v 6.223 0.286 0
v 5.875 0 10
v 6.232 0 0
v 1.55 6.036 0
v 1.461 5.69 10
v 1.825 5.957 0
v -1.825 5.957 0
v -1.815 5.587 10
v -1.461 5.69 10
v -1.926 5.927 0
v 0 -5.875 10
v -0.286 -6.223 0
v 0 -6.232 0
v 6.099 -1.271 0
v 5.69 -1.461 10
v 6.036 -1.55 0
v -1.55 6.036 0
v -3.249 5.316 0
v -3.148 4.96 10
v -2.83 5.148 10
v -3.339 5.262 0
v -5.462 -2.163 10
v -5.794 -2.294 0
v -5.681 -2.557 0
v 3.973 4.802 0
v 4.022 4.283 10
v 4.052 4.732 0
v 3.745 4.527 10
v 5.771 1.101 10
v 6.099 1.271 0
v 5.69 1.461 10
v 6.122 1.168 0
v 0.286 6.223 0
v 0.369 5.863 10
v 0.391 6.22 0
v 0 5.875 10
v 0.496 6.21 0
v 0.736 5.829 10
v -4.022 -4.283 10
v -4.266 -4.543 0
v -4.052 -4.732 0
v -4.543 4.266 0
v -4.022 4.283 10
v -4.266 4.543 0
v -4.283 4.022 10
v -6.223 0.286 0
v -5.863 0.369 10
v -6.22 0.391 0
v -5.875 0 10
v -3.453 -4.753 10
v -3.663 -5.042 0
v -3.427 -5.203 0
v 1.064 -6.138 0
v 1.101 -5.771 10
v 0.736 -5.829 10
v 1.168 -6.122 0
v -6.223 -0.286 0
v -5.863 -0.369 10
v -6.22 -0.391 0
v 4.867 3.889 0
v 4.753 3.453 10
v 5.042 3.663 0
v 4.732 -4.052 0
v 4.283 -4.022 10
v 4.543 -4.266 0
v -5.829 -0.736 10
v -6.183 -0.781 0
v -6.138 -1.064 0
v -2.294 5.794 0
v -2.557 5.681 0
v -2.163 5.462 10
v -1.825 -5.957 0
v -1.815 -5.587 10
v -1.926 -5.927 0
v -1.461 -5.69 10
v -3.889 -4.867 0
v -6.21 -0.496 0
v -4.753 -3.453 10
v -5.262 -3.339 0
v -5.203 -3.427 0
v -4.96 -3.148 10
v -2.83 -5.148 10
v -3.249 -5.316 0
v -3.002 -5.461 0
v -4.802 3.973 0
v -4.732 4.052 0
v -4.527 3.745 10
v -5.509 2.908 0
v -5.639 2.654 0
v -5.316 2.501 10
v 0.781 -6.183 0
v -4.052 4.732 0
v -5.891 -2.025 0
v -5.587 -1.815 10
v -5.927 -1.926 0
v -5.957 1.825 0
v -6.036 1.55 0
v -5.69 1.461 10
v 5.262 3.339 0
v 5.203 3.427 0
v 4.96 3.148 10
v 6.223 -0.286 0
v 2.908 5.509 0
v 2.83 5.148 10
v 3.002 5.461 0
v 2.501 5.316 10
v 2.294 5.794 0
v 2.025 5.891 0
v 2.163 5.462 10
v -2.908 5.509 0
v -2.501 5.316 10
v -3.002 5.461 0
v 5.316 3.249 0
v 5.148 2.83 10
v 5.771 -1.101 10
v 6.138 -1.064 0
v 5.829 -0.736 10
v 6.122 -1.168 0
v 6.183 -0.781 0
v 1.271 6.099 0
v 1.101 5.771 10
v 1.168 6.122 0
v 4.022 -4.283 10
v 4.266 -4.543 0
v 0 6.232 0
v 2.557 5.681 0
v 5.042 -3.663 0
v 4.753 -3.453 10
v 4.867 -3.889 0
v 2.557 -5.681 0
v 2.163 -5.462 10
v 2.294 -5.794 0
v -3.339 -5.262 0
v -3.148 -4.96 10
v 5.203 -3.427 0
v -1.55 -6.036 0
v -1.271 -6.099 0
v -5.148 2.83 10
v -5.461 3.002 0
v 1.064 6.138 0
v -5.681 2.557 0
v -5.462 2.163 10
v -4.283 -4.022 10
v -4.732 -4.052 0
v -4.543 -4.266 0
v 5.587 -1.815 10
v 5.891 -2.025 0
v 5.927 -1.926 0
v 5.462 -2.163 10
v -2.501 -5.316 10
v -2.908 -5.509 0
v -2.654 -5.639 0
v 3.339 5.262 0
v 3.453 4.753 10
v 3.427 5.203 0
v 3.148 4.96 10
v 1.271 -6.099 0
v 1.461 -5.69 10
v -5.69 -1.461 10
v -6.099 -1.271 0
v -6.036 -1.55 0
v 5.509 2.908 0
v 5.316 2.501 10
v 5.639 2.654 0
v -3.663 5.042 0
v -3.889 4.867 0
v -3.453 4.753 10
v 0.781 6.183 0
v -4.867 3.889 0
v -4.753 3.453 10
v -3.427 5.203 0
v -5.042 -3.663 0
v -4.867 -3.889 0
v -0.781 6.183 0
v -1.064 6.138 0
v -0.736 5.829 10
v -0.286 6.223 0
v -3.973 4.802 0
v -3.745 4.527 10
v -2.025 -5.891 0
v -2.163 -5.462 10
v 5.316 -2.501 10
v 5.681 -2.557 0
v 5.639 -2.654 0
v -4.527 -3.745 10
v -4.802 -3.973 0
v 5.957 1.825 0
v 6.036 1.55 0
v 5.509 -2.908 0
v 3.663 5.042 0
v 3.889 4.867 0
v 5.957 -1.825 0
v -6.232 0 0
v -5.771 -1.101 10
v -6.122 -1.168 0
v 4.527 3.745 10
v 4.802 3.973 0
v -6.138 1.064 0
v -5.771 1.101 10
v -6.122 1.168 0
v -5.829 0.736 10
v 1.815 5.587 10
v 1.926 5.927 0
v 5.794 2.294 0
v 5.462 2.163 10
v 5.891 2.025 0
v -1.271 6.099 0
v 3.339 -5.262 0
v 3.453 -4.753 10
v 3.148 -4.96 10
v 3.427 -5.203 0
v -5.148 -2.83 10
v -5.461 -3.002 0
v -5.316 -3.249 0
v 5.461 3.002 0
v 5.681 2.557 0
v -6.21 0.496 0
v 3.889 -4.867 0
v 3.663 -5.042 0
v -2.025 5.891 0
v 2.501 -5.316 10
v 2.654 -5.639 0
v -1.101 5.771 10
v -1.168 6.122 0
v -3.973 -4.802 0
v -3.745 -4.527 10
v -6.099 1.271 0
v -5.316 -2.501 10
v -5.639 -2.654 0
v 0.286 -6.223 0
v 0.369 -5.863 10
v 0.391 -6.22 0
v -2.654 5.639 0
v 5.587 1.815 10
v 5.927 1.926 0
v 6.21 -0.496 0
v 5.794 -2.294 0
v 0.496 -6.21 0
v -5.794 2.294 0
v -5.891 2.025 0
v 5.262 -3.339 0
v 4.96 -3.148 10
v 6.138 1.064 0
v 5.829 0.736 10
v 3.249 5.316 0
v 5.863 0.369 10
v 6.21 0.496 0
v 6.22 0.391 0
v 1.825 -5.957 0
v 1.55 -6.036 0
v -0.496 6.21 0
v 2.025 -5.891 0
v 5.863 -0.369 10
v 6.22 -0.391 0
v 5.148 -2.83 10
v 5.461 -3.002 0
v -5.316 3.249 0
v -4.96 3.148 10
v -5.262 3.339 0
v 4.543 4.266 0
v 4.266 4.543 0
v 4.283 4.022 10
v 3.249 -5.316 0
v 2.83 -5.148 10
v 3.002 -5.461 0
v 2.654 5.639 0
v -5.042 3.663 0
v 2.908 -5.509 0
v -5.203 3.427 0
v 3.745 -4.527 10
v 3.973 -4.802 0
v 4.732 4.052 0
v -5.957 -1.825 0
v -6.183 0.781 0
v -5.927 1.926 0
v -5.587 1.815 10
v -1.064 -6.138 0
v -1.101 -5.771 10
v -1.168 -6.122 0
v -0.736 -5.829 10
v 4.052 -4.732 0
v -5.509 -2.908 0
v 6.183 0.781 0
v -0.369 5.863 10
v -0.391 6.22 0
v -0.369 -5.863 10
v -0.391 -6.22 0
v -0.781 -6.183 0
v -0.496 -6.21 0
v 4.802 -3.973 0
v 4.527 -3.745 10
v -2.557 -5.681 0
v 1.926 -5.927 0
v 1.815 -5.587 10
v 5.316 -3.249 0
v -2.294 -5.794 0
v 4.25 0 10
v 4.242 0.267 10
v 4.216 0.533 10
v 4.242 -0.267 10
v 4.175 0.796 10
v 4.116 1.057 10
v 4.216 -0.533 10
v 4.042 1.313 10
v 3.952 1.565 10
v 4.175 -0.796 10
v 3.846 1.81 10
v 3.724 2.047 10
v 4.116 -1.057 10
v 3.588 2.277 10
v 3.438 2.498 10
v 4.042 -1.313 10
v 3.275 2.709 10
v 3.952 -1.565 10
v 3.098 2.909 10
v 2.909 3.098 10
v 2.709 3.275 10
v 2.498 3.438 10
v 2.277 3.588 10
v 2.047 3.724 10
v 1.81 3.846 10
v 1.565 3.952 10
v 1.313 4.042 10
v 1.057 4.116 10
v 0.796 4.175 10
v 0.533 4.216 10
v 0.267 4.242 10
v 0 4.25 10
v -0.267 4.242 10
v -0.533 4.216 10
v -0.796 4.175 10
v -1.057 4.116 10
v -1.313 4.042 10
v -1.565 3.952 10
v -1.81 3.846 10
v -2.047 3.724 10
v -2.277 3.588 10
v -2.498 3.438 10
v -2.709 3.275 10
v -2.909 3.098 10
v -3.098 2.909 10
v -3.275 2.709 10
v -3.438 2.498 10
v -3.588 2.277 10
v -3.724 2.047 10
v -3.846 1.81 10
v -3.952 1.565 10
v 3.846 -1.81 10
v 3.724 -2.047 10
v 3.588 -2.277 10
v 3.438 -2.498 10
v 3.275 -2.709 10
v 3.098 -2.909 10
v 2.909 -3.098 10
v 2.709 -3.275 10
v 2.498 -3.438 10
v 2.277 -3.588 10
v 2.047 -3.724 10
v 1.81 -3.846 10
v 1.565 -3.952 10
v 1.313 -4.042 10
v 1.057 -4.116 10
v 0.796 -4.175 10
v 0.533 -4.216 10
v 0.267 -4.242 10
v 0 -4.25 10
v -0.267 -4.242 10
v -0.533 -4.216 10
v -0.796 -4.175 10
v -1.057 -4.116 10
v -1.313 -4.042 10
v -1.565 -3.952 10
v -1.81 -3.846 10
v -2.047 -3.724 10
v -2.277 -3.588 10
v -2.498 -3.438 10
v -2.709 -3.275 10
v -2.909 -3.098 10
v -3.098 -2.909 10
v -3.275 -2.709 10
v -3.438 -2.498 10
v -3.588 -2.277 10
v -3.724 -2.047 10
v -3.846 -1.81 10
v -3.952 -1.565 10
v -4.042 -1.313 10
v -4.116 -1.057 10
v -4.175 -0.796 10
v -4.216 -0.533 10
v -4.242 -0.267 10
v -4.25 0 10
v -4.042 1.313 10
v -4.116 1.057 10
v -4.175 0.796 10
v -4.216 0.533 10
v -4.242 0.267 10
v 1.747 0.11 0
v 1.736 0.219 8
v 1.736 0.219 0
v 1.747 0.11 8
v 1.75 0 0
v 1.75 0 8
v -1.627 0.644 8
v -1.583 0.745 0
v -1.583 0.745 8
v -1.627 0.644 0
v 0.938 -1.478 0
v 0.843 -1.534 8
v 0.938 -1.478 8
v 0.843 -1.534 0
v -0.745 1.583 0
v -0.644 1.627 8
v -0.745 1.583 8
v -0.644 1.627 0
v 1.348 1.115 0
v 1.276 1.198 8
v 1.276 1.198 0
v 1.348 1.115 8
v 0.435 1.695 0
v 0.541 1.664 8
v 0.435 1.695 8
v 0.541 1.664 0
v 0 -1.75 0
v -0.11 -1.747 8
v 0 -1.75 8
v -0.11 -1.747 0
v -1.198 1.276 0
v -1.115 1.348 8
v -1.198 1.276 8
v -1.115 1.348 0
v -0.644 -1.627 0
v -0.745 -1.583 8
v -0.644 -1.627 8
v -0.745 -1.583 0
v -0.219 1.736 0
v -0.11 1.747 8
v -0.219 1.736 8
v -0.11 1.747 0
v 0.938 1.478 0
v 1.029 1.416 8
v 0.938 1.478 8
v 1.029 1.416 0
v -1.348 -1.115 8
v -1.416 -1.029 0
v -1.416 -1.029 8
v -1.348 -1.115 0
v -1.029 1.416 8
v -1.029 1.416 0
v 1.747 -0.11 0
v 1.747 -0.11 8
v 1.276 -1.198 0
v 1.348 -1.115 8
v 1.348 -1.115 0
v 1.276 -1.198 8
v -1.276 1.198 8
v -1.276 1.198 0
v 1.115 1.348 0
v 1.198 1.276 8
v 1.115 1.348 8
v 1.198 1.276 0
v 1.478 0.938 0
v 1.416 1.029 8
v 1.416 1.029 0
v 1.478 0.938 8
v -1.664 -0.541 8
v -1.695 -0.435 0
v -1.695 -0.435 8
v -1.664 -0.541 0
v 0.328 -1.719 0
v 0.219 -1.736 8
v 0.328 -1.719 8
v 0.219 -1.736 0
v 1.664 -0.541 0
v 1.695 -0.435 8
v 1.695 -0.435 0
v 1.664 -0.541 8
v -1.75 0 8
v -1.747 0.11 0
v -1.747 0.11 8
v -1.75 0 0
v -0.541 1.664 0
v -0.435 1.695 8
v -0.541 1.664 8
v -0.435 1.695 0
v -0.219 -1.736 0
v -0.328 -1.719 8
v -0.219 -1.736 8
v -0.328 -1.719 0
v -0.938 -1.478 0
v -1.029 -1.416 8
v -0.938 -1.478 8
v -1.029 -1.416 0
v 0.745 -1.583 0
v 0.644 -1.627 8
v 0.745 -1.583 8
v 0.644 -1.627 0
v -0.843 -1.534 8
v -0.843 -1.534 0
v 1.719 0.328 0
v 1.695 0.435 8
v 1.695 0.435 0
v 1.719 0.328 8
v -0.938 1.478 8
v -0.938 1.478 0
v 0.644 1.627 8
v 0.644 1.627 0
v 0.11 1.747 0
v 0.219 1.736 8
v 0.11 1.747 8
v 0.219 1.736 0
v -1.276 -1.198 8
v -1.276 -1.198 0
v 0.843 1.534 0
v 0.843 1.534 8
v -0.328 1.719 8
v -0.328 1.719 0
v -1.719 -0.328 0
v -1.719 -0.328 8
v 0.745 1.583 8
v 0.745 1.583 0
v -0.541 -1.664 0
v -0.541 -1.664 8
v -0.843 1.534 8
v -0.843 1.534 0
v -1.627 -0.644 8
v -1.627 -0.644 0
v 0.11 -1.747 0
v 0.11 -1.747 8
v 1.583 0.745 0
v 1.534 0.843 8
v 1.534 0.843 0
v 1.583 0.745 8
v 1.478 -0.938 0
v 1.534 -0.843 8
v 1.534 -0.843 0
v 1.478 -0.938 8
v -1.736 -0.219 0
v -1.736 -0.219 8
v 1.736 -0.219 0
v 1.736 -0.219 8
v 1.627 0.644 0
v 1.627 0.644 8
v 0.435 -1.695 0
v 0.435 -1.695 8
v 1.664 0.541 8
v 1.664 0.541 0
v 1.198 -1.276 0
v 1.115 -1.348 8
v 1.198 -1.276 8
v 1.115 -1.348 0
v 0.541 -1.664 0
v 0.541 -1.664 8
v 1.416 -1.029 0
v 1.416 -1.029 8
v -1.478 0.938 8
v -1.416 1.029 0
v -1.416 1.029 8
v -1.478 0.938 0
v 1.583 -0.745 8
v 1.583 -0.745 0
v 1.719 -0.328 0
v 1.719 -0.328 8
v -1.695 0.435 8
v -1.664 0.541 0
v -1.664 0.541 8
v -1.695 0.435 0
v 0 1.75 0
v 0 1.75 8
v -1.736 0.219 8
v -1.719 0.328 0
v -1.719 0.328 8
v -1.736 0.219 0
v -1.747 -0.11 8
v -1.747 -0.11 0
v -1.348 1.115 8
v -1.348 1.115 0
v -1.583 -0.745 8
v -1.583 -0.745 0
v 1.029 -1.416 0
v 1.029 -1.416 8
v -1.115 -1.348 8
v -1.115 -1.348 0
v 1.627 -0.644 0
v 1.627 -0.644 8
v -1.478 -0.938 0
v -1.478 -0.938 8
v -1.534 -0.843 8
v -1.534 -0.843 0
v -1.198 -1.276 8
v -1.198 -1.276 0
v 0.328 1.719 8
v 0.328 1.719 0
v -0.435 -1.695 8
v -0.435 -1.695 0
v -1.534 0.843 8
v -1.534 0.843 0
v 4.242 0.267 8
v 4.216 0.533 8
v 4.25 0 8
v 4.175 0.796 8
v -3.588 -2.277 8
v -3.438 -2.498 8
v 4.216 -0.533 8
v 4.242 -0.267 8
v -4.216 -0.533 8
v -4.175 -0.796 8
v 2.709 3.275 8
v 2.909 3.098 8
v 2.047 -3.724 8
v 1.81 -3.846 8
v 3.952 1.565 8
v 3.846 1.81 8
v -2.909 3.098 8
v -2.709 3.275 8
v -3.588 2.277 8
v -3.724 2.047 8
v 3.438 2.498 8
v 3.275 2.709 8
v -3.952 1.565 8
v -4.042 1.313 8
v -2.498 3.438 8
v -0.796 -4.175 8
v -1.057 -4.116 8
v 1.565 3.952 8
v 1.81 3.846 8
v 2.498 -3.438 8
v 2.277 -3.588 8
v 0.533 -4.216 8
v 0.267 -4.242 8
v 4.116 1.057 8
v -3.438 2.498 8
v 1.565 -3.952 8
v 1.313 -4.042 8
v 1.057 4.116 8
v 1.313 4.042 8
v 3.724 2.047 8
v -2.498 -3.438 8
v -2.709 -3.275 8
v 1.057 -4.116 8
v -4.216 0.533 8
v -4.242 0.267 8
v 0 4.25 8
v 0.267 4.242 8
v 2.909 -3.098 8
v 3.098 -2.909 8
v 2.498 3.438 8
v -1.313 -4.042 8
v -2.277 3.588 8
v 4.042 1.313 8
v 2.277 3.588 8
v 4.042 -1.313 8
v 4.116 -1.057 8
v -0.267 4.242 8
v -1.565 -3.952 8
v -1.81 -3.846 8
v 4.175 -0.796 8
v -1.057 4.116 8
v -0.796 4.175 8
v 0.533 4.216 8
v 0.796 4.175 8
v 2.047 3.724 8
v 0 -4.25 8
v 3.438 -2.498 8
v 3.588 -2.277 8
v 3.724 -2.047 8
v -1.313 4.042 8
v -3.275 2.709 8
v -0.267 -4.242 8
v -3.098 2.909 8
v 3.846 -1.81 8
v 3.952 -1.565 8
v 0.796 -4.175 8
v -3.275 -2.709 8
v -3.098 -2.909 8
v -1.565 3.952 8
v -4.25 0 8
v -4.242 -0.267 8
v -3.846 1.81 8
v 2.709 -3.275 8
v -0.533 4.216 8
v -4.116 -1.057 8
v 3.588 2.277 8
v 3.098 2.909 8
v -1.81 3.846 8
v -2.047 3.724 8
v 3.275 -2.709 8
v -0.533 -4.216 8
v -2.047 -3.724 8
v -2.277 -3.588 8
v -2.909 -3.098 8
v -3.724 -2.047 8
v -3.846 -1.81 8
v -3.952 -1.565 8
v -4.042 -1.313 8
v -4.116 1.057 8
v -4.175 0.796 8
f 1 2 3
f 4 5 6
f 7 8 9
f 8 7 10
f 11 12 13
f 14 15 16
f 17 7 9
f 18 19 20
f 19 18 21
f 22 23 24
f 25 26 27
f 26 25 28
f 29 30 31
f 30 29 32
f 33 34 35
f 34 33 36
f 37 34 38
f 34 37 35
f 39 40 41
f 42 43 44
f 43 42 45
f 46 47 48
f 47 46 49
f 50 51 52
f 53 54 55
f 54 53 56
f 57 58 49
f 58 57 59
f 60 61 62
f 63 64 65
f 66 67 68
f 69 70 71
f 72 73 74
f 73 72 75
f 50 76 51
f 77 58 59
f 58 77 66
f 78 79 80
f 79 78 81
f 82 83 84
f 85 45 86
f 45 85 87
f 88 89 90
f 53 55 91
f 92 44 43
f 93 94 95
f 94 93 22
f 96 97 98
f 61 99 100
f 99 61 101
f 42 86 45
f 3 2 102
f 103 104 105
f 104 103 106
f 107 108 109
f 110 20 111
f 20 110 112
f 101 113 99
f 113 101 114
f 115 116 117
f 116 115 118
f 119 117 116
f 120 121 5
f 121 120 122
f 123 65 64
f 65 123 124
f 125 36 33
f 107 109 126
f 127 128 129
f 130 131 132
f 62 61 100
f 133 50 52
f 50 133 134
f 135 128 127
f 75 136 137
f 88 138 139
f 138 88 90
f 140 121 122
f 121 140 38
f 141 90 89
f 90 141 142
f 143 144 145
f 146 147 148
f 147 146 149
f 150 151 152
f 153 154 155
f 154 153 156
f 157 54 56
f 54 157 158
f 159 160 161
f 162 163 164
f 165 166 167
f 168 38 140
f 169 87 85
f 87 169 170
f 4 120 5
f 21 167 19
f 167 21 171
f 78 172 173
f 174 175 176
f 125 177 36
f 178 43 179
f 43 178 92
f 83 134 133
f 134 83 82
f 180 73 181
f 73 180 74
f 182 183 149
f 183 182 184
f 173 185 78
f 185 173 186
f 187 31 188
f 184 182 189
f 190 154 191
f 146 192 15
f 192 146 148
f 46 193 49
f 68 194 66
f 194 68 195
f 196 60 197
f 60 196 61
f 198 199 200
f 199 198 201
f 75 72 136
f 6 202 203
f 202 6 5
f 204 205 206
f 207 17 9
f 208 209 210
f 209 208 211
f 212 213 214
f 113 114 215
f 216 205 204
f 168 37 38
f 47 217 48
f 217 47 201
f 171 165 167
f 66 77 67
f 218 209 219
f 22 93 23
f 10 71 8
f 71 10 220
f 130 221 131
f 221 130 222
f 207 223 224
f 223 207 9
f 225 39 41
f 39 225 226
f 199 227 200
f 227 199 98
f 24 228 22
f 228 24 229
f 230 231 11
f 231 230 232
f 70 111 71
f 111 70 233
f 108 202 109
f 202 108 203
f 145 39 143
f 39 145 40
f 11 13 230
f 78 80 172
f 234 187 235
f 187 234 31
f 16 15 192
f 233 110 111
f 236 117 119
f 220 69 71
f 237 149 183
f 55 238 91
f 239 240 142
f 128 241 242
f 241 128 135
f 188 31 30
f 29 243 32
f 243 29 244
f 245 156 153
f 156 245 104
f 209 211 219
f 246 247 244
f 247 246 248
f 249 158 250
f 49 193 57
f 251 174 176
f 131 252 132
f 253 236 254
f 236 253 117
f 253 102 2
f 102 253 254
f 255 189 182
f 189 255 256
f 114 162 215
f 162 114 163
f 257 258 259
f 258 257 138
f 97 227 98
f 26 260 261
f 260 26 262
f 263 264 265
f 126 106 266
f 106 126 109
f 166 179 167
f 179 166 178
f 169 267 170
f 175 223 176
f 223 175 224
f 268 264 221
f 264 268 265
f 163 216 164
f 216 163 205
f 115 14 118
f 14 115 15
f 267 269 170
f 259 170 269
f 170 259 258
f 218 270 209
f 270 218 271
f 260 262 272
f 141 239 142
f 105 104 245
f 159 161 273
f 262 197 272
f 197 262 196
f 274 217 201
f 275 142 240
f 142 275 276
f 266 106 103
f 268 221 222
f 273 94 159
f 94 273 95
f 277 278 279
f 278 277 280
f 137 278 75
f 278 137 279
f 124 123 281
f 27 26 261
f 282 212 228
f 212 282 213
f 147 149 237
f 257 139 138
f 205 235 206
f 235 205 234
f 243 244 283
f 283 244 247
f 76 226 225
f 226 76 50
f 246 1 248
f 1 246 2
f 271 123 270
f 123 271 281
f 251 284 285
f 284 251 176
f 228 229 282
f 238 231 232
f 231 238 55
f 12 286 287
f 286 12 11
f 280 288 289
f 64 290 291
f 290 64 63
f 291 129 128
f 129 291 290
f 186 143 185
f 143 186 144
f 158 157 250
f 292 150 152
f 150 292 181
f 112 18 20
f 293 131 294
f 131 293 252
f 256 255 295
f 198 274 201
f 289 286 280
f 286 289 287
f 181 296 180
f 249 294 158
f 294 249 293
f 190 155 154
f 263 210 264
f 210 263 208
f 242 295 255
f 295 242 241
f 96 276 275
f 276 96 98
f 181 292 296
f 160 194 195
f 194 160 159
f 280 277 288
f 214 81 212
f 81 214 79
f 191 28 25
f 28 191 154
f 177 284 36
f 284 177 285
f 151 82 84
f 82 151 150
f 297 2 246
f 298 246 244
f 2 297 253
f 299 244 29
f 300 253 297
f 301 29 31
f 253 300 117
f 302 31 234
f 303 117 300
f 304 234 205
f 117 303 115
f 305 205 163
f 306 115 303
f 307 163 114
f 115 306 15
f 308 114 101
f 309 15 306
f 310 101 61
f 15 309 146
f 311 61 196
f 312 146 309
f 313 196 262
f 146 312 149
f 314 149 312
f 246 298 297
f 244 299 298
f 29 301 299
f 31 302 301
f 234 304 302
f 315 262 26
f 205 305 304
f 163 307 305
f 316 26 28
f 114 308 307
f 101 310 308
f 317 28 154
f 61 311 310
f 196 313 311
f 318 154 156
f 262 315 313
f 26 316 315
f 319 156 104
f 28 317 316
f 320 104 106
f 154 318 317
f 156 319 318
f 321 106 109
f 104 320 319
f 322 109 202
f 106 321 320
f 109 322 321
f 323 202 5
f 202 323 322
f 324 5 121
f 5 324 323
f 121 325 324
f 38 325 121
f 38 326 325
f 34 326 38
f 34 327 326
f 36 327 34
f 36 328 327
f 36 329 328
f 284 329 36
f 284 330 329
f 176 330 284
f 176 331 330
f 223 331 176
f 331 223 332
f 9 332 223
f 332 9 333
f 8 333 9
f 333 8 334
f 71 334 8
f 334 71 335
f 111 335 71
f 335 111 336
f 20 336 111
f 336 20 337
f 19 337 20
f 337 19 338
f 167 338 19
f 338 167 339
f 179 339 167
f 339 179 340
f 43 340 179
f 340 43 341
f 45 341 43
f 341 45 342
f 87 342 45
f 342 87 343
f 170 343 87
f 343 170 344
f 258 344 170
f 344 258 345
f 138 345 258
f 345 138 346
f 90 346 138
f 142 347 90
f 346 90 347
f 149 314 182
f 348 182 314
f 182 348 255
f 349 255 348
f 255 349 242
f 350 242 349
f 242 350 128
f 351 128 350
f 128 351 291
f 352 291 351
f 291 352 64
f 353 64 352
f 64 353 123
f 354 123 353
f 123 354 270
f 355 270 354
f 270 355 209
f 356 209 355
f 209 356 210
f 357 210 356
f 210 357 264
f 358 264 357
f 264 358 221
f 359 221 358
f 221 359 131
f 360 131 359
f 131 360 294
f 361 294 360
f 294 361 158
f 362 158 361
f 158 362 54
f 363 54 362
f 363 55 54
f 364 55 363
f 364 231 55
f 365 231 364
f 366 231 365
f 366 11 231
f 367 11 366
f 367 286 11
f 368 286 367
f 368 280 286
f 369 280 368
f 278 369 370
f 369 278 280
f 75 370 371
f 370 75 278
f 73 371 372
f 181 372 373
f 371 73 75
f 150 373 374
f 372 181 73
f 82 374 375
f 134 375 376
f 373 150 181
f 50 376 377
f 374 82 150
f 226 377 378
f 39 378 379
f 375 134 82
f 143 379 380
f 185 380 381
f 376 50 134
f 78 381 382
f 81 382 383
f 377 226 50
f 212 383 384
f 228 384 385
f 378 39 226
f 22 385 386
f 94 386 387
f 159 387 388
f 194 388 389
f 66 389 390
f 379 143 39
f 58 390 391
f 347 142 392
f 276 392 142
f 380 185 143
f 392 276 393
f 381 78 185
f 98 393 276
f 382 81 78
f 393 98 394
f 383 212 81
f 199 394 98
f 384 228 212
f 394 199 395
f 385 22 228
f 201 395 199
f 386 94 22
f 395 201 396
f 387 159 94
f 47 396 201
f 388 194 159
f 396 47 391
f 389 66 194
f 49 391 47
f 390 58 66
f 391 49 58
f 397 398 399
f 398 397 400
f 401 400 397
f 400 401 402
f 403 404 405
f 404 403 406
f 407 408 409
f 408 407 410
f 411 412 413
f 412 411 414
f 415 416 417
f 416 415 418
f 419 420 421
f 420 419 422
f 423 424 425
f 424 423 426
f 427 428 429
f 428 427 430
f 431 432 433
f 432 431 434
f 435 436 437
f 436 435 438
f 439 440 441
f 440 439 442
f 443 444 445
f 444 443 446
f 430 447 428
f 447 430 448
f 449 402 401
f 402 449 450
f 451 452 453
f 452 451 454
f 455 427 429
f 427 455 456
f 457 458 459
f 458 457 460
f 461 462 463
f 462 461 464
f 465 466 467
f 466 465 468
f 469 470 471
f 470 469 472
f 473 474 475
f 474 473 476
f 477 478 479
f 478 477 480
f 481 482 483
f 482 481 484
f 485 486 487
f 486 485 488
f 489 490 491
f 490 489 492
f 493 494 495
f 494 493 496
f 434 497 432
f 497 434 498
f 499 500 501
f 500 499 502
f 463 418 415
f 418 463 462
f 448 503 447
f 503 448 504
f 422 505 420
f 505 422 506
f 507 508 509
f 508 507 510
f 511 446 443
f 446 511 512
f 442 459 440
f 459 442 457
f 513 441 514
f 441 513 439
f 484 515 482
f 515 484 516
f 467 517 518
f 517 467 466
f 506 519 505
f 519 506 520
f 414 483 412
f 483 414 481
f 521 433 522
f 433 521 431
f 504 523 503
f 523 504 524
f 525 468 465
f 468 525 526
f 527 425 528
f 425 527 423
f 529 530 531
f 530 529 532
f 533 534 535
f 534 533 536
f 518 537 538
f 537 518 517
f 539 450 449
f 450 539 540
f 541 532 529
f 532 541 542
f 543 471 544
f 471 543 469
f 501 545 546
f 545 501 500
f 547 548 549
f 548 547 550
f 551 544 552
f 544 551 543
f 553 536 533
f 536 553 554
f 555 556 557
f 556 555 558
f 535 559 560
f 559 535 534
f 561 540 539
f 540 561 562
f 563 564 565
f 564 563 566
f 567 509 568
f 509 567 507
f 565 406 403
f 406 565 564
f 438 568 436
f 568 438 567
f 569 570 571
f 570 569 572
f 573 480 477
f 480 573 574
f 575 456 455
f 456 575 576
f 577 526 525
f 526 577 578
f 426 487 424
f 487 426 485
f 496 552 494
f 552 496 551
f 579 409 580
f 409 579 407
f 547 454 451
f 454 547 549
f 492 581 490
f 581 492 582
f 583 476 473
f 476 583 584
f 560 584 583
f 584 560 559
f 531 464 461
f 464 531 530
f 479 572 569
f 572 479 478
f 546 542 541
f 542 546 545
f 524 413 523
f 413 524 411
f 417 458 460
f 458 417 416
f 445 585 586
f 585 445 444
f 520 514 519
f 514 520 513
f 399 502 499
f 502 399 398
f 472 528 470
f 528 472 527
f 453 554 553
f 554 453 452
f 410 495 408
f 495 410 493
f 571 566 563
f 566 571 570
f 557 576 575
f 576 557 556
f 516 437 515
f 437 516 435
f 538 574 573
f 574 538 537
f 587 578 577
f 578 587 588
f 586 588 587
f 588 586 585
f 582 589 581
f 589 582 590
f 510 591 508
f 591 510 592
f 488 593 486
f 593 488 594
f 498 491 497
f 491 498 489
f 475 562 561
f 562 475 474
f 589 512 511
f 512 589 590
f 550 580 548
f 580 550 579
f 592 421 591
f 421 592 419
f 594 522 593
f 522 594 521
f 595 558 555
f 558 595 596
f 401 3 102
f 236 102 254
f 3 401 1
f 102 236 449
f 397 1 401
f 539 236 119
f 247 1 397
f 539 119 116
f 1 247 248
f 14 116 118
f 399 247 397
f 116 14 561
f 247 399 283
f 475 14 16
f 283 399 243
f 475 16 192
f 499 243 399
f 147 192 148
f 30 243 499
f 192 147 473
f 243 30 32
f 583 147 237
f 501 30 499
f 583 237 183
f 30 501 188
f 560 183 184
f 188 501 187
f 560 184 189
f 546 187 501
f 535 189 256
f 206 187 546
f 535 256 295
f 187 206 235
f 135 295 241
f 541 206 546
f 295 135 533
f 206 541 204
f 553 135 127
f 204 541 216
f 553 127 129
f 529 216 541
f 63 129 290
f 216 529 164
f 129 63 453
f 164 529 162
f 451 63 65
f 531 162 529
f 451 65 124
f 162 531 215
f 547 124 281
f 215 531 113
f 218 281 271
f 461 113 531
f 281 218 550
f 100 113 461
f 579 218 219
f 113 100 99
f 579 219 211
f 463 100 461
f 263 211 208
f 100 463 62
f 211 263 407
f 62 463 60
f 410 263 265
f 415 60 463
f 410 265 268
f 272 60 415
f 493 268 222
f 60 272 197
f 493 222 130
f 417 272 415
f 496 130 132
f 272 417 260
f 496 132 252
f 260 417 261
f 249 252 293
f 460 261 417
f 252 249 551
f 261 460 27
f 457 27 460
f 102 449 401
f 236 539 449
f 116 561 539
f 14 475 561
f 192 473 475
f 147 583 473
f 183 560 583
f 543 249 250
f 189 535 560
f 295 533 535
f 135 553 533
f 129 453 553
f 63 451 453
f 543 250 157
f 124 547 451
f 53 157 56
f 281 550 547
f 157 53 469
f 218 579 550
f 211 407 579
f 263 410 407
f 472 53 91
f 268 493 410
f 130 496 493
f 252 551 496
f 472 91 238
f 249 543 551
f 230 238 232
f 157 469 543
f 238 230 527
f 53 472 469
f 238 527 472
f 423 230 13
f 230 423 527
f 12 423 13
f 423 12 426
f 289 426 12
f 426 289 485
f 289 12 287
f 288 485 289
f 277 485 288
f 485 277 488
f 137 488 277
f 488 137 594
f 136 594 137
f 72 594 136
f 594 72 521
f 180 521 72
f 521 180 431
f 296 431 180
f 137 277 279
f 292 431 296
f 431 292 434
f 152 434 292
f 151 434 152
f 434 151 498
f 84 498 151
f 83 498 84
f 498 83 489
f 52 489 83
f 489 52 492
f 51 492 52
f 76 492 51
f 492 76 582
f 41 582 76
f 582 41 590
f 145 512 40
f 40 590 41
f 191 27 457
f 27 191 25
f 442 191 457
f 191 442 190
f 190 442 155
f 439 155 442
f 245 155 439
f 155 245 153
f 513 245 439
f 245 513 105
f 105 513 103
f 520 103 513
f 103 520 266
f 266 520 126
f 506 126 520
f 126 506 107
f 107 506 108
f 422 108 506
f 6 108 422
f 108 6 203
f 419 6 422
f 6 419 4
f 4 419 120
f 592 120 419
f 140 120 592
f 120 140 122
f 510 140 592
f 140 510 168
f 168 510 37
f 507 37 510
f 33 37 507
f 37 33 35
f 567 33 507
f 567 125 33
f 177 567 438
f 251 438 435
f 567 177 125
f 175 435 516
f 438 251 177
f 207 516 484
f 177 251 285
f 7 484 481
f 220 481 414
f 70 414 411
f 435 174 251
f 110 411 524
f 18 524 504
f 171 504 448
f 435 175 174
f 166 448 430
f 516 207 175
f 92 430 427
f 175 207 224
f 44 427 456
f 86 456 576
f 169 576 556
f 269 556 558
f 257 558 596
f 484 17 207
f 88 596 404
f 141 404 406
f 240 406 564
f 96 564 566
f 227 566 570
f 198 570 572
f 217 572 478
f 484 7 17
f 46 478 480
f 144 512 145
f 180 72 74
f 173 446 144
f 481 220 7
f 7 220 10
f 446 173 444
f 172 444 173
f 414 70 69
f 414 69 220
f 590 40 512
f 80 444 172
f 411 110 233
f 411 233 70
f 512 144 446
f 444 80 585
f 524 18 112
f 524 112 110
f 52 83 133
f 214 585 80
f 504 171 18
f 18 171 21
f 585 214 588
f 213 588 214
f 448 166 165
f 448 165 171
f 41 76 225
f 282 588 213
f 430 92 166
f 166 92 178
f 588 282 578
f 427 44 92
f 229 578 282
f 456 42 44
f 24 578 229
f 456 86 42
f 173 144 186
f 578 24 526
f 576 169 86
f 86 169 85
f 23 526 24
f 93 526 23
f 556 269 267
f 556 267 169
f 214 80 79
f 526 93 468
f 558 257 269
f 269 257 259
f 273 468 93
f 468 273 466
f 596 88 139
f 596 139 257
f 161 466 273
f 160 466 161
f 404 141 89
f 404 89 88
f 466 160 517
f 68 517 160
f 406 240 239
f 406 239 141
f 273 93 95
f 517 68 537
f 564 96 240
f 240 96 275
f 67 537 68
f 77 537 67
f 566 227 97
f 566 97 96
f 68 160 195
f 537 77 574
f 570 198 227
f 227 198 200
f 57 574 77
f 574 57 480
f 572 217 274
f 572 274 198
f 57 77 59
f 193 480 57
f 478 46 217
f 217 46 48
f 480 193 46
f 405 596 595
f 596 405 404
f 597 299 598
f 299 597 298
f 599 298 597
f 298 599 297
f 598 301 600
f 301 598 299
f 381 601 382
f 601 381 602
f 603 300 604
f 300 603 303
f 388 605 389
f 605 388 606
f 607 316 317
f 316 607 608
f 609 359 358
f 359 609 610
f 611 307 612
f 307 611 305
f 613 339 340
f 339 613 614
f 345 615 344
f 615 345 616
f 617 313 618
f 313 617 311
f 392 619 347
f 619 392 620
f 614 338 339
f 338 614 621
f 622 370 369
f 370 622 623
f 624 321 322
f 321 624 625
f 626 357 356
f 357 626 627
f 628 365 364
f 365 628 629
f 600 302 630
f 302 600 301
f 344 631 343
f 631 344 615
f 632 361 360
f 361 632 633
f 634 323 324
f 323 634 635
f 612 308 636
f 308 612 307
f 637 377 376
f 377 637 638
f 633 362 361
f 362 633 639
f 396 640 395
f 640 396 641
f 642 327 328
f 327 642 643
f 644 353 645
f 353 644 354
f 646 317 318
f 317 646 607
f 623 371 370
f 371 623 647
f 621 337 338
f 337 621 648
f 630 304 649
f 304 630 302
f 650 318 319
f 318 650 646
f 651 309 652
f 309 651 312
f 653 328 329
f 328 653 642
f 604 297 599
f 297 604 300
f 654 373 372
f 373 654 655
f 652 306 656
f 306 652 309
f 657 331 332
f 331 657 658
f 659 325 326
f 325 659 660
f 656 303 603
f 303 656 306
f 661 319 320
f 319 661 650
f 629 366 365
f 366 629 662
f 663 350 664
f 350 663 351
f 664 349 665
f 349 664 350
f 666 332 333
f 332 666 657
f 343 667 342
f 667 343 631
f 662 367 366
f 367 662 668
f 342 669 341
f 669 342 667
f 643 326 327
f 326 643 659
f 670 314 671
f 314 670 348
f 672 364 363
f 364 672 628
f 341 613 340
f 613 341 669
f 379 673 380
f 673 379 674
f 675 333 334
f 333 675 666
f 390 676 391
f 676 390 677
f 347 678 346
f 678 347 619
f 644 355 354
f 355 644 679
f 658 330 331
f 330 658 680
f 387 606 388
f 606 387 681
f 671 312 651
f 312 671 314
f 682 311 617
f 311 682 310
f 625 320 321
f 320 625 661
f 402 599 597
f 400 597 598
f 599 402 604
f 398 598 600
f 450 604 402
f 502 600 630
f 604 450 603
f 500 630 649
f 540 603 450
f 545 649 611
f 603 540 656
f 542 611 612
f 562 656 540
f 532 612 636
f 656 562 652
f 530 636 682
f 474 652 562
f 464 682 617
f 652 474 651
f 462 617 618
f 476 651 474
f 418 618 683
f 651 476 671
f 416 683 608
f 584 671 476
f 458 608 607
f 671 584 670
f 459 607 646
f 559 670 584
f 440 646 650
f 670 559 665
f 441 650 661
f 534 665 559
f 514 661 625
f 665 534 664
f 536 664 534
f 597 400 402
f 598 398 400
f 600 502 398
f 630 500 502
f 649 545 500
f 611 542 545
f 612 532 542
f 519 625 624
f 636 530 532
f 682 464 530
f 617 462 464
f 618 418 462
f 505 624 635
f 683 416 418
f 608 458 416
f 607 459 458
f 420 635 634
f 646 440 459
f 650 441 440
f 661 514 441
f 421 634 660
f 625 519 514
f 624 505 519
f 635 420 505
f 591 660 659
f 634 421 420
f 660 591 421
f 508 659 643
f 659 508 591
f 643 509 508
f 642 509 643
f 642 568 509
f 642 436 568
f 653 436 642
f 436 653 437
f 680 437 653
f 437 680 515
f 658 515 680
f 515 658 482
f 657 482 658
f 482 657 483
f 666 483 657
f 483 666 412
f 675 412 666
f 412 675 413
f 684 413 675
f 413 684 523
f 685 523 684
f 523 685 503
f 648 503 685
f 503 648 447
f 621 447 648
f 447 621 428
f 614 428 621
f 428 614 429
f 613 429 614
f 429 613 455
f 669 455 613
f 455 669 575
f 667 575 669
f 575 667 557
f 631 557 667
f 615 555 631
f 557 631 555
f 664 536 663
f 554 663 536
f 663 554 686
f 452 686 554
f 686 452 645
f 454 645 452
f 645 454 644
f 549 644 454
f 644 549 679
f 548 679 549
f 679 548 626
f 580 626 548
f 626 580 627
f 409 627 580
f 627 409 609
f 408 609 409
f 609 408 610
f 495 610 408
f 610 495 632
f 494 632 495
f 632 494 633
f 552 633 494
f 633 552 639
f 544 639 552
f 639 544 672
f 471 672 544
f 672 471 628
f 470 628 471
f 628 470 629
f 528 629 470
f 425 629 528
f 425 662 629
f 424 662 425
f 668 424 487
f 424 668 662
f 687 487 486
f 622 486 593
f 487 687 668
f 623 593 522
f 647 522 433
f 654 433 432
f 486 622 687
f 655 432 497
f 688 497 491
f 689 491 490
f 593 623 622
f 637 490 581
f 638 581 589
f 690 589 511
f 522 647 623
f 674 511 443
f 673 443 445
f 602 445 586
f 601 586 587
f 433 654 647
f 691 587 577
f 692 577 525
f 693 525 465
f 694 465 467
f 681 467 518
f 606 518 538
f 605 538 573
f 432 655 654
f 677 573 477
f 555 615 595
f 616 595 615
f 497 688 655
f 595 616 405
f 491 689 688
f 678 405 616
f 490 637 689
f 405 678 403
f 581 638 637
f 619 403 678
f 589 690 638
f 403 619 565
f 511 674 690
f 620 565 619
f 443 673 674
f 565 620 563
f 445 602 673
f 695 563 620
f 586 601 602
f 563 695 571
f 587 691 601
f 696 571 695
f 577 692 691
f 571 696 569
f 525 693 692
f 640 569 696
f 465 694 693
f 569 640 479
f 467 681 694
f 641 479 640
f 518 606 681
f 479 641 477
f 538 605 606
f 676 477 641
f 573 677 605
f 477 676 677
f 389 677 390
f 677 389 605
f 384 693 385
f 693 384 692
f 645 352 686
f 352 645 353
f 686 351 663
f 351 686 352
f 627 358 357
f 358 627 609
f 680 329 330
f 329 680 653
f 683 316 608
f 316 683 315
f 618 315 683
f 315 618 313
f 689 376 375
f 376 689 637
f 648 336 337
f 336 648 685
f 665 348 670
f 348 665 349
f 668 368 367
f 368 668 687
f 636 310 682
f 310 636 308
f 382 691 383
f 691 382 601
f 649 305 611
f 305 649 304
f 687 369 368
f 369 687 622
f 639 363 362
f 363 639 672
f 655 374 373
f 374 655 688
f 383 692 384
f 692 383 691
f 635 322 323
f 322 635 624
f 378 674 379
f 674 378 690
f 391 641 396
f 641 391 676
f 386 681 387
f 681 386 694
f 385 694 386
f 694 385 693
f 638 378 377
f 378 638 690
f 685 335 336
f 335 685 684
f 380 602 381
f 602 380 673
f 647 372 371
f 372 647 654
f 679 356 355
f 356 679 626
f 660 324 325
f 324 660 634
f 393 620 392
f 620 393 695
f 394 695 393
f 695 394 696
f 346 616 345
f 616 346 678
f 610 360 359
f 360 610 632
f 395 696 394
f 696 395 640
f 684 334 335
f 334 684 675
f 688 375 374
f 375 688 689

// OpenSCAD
BEARING_INNER_DIA = 12.75;
BEARING_THICKNESS = 10;
THICKNESS = 2;

HOLE_DIA = 3.5;
HOLE_HEAD_DIA = 8.5;
HOLE_HEAD_THICKNESS = 2;

$fn = 100;

intersection(){
  difference() {
    translate([0, 0, -2 * THICKNESS])
    cylinder(d1 = BEARING_INNER_DIA, d2 = BEARING_INNER_DIA - 1, h = 2 * THICKNESS + BEARING_THICKNESS);

    cylinder(d = HOLE_DIA, h = BEARING_THICKNESS);

    translate([0, 0, BEARING_THICKNESS - HOLE_HEAD_THICKNESS])
    cylinder(d = HOLE_HEAD_DIA, h = HOLE_HEAD_THICKNESS);
  }
cylinder(d = BEARING_INNER_DIA, h = BEARING_THICKNESS);
}
